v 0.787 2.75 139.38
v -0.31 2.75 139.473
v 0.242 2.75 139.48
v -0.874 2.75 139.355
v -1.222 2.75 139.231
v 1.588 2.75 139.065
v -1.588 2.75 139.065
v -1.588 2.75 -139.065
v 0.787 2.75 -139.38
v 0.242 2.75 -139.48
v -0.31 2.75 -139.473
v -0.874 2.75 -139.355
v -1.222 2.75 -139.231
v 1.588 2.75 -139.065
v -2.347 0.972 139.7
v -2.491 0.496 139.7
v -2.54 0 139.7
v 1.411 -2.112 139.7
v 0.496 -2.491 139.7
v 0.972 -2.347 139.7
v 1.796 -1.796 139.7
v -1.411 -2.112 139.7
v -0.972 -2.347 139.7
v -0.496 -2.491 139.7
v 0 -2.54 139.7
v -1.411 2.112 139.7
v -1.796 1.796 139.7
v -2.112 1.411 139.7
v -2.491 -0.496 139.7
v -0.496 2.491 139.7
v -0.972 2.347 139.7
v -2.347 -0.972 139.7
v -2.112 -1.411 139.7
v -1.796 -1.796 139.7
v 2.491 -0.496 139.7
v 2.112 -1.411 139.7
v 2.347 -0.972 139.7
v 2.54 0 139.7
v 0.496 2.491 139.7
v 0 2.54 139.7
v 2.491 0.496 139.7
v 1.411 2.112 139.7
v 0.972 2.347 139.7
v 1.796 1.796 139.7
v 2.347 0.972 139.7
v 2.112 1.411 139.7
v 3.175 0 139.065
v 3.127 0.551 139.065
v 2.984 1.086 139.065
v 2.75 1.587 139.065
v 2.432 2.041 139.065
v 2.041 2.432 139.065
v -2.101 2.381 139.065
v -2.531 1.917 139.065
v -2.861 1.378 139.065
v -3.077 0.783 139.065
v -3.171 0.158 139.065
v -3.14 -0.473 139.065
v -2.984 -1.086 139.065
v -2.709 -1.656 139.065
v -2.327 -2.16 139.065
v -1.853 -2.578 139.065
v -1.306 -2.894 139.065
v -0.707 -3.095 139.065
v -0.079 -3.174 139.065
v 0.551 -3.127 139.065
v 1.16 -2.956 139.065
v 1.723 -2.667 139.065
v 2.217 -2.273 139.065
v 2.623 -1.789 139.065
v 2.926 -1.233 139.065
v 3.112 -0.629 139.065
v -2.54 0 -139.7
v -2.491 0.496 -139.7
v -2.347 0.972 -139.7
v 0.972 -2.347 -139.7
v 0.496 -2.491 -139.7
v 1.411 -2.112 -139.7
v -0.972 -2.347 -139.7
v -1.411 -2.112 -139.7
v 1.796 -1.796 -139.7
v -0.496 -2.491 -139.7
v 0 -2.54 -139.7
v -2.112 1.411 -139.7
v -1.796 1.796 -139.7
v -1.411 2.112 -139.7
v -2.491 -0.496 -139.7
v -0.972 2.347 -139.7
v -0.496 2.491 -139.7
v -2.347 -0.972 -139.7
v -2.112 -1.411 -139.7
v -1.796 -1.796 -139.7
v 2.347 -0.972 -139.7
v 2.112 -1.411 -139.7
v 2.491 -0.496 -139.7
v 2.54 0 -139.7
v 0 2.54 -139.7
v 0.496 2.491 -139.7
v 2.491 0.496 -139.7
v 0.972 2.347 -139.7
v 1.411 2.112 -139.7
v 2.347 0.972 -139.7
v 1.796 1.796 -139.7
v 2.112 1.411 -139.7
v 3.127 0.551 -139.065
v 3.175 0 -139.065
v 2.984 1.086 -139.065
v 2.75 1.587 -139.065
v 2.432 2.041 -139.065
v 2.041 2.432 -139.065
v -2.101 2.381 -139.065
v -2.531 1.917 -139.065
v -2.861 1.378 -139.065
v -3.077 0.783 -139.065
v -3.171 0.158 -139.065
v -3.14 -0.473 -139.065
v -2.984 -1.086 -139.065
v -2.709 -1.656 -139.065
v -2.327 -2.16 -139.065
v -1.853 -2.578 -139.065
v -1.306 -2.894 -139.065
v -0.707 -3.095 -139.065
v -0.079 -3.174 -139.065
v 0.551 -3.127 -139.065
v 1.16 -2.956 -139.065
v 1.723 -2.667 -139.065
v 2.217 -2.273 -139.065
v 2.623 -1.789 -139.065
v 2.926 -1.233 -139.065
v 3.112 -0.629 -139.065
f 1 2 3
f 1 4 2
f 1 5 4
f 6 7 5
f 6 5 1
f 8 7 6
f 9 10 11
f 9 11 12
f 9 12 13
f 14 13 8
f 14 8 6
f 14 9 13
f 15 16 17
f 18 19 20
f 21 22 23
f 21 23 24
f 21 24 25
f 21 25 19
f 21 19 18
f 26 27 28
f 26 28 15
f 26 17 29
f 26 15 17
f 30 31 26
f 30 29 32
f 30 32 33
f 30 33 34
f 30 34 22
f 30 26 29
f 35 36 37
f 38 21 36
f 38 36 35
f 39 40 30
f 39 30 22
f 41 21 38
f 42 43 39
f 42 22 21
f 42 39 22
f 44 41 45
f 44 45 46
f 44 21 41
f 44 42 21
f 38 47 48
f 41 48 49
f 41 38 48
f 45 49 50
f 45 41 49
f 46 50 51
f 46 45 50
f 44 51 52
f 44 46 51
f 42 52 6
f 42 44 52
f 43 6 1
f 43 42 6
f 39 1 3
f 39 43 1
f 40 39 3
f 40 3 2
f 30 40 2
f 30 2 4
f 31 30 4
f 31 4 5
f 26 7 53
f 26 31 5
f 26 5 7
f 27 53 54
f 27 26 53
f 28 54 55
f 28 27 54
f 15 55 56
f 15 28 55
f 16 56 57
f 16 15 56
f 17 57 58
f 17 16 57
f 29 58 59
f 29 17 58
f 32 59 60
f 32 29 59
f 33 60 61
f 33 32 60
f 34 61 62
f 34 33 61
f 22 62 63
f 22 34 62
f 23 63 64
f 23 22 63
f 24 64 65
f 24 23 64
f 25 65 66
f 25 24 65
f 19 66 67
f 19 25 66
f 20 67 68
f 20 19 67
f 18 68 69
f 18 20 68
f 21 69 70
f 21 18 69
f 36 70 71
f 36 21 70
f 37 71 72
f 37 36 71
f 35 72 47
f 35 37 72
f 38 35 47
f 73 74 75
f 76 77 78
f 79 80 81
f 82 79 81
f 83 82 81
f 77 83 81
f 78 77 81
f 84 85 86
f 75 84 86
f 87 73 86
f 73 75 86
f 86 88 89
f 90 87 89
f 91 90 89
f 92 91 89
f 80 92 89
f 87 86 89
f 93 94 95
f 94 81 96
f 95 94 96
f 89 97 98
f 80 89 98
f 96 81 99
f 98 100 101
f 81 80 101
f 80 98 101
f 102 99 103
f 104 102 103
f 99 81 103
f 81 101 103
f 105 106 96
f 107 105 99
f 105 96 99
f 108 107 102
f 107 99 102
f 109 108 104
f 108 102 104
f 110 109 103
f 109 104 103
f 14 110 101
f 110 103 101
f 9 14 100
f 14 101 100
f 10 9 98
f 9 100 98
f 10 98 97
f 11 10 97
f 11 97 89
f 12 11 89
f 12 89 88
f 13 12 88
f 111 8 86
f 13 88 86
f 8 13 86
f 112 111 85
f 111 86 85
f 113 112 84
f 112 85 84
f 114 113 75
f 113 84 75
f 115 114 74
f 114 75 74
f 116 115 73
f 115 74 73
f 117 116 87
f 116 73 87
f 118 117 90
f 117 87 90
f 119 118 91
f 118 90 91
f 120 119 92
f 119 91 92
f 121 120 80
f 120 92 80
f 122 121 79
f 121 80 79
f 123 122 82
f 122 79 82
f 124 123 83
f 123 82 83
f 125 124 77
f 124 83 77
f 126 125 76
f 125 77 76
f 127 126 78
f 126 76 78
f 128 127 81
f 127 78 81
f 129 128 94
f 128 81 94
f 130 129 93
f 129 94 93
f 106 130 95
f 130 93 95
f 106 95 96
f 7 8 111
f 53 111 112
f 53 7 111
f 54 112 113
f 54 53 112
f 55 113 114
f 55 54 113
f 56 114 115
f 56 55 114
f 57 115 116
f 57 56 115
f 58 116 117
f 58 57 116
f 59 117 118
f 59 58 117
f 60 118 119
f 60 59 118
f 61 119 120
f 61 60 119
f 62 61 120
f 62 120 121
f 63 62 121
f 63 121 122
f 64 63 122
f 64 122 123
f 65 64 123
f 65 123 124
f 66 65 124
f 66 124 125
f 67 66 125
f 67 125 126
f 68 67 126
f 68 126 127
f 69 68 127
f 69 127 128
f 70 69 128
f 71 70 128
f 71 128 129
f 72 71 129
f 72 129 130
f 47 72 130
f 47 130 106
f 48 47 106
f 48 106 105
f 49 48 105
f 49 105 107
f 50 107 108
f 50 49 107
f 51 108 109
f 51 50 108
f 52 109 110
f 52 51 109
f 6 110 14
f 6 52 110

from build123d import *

# Parameters (mm, degrees)
SKETCH1_R           = 3.175
EXTRUDE1_DEPTH      = 139.7
CHAMFER1_SIZE       = 0.635
EXTRUDE7_DEPTH      = 140.7
EXTRUDE7_DEPTH_BACK = 140.7


with BuildPart() as part:
    # Sketch1 → Extrude1 (new body, symmetric)
    with BuildSketch(Plane.XY):
        Circle(SKETCH1_R)
    extrude(amount=EXTRUDE1_DEPTH, both=True)

    # Chamfer1
    chamfer1_edges = [part.edges().sort_by_distance(p)[0] for p in [
        (-3.175, 0, -139.7),
        (-3.175, 0, 139.7),
    ]]
    chamfer(chamfer1_edges, length=CHAMFER1_SIZE)

    # Sketch13 → Extrude7 (cut, two sides)
    with BuildSketch(Plane.XY) as extrude7_sk:
        with BuildLine():
            Line((-1.5875, 2.749630657), (1.5875, 2.749630657))
            ThreePointArc((1.5875, 2.749630657), (0, 3.175), (-1.5875, 2.749630657))
        make_face()
    extrude(amount=EXTRUDE7_DEPTH, mode=Mode.SUBTRACT)
    extrude(extrude7_sk.sketch, amount=-EXTRUDE7_DEPTH_BACK, mode=Mode.SUBTRACT)


solid = part.part
